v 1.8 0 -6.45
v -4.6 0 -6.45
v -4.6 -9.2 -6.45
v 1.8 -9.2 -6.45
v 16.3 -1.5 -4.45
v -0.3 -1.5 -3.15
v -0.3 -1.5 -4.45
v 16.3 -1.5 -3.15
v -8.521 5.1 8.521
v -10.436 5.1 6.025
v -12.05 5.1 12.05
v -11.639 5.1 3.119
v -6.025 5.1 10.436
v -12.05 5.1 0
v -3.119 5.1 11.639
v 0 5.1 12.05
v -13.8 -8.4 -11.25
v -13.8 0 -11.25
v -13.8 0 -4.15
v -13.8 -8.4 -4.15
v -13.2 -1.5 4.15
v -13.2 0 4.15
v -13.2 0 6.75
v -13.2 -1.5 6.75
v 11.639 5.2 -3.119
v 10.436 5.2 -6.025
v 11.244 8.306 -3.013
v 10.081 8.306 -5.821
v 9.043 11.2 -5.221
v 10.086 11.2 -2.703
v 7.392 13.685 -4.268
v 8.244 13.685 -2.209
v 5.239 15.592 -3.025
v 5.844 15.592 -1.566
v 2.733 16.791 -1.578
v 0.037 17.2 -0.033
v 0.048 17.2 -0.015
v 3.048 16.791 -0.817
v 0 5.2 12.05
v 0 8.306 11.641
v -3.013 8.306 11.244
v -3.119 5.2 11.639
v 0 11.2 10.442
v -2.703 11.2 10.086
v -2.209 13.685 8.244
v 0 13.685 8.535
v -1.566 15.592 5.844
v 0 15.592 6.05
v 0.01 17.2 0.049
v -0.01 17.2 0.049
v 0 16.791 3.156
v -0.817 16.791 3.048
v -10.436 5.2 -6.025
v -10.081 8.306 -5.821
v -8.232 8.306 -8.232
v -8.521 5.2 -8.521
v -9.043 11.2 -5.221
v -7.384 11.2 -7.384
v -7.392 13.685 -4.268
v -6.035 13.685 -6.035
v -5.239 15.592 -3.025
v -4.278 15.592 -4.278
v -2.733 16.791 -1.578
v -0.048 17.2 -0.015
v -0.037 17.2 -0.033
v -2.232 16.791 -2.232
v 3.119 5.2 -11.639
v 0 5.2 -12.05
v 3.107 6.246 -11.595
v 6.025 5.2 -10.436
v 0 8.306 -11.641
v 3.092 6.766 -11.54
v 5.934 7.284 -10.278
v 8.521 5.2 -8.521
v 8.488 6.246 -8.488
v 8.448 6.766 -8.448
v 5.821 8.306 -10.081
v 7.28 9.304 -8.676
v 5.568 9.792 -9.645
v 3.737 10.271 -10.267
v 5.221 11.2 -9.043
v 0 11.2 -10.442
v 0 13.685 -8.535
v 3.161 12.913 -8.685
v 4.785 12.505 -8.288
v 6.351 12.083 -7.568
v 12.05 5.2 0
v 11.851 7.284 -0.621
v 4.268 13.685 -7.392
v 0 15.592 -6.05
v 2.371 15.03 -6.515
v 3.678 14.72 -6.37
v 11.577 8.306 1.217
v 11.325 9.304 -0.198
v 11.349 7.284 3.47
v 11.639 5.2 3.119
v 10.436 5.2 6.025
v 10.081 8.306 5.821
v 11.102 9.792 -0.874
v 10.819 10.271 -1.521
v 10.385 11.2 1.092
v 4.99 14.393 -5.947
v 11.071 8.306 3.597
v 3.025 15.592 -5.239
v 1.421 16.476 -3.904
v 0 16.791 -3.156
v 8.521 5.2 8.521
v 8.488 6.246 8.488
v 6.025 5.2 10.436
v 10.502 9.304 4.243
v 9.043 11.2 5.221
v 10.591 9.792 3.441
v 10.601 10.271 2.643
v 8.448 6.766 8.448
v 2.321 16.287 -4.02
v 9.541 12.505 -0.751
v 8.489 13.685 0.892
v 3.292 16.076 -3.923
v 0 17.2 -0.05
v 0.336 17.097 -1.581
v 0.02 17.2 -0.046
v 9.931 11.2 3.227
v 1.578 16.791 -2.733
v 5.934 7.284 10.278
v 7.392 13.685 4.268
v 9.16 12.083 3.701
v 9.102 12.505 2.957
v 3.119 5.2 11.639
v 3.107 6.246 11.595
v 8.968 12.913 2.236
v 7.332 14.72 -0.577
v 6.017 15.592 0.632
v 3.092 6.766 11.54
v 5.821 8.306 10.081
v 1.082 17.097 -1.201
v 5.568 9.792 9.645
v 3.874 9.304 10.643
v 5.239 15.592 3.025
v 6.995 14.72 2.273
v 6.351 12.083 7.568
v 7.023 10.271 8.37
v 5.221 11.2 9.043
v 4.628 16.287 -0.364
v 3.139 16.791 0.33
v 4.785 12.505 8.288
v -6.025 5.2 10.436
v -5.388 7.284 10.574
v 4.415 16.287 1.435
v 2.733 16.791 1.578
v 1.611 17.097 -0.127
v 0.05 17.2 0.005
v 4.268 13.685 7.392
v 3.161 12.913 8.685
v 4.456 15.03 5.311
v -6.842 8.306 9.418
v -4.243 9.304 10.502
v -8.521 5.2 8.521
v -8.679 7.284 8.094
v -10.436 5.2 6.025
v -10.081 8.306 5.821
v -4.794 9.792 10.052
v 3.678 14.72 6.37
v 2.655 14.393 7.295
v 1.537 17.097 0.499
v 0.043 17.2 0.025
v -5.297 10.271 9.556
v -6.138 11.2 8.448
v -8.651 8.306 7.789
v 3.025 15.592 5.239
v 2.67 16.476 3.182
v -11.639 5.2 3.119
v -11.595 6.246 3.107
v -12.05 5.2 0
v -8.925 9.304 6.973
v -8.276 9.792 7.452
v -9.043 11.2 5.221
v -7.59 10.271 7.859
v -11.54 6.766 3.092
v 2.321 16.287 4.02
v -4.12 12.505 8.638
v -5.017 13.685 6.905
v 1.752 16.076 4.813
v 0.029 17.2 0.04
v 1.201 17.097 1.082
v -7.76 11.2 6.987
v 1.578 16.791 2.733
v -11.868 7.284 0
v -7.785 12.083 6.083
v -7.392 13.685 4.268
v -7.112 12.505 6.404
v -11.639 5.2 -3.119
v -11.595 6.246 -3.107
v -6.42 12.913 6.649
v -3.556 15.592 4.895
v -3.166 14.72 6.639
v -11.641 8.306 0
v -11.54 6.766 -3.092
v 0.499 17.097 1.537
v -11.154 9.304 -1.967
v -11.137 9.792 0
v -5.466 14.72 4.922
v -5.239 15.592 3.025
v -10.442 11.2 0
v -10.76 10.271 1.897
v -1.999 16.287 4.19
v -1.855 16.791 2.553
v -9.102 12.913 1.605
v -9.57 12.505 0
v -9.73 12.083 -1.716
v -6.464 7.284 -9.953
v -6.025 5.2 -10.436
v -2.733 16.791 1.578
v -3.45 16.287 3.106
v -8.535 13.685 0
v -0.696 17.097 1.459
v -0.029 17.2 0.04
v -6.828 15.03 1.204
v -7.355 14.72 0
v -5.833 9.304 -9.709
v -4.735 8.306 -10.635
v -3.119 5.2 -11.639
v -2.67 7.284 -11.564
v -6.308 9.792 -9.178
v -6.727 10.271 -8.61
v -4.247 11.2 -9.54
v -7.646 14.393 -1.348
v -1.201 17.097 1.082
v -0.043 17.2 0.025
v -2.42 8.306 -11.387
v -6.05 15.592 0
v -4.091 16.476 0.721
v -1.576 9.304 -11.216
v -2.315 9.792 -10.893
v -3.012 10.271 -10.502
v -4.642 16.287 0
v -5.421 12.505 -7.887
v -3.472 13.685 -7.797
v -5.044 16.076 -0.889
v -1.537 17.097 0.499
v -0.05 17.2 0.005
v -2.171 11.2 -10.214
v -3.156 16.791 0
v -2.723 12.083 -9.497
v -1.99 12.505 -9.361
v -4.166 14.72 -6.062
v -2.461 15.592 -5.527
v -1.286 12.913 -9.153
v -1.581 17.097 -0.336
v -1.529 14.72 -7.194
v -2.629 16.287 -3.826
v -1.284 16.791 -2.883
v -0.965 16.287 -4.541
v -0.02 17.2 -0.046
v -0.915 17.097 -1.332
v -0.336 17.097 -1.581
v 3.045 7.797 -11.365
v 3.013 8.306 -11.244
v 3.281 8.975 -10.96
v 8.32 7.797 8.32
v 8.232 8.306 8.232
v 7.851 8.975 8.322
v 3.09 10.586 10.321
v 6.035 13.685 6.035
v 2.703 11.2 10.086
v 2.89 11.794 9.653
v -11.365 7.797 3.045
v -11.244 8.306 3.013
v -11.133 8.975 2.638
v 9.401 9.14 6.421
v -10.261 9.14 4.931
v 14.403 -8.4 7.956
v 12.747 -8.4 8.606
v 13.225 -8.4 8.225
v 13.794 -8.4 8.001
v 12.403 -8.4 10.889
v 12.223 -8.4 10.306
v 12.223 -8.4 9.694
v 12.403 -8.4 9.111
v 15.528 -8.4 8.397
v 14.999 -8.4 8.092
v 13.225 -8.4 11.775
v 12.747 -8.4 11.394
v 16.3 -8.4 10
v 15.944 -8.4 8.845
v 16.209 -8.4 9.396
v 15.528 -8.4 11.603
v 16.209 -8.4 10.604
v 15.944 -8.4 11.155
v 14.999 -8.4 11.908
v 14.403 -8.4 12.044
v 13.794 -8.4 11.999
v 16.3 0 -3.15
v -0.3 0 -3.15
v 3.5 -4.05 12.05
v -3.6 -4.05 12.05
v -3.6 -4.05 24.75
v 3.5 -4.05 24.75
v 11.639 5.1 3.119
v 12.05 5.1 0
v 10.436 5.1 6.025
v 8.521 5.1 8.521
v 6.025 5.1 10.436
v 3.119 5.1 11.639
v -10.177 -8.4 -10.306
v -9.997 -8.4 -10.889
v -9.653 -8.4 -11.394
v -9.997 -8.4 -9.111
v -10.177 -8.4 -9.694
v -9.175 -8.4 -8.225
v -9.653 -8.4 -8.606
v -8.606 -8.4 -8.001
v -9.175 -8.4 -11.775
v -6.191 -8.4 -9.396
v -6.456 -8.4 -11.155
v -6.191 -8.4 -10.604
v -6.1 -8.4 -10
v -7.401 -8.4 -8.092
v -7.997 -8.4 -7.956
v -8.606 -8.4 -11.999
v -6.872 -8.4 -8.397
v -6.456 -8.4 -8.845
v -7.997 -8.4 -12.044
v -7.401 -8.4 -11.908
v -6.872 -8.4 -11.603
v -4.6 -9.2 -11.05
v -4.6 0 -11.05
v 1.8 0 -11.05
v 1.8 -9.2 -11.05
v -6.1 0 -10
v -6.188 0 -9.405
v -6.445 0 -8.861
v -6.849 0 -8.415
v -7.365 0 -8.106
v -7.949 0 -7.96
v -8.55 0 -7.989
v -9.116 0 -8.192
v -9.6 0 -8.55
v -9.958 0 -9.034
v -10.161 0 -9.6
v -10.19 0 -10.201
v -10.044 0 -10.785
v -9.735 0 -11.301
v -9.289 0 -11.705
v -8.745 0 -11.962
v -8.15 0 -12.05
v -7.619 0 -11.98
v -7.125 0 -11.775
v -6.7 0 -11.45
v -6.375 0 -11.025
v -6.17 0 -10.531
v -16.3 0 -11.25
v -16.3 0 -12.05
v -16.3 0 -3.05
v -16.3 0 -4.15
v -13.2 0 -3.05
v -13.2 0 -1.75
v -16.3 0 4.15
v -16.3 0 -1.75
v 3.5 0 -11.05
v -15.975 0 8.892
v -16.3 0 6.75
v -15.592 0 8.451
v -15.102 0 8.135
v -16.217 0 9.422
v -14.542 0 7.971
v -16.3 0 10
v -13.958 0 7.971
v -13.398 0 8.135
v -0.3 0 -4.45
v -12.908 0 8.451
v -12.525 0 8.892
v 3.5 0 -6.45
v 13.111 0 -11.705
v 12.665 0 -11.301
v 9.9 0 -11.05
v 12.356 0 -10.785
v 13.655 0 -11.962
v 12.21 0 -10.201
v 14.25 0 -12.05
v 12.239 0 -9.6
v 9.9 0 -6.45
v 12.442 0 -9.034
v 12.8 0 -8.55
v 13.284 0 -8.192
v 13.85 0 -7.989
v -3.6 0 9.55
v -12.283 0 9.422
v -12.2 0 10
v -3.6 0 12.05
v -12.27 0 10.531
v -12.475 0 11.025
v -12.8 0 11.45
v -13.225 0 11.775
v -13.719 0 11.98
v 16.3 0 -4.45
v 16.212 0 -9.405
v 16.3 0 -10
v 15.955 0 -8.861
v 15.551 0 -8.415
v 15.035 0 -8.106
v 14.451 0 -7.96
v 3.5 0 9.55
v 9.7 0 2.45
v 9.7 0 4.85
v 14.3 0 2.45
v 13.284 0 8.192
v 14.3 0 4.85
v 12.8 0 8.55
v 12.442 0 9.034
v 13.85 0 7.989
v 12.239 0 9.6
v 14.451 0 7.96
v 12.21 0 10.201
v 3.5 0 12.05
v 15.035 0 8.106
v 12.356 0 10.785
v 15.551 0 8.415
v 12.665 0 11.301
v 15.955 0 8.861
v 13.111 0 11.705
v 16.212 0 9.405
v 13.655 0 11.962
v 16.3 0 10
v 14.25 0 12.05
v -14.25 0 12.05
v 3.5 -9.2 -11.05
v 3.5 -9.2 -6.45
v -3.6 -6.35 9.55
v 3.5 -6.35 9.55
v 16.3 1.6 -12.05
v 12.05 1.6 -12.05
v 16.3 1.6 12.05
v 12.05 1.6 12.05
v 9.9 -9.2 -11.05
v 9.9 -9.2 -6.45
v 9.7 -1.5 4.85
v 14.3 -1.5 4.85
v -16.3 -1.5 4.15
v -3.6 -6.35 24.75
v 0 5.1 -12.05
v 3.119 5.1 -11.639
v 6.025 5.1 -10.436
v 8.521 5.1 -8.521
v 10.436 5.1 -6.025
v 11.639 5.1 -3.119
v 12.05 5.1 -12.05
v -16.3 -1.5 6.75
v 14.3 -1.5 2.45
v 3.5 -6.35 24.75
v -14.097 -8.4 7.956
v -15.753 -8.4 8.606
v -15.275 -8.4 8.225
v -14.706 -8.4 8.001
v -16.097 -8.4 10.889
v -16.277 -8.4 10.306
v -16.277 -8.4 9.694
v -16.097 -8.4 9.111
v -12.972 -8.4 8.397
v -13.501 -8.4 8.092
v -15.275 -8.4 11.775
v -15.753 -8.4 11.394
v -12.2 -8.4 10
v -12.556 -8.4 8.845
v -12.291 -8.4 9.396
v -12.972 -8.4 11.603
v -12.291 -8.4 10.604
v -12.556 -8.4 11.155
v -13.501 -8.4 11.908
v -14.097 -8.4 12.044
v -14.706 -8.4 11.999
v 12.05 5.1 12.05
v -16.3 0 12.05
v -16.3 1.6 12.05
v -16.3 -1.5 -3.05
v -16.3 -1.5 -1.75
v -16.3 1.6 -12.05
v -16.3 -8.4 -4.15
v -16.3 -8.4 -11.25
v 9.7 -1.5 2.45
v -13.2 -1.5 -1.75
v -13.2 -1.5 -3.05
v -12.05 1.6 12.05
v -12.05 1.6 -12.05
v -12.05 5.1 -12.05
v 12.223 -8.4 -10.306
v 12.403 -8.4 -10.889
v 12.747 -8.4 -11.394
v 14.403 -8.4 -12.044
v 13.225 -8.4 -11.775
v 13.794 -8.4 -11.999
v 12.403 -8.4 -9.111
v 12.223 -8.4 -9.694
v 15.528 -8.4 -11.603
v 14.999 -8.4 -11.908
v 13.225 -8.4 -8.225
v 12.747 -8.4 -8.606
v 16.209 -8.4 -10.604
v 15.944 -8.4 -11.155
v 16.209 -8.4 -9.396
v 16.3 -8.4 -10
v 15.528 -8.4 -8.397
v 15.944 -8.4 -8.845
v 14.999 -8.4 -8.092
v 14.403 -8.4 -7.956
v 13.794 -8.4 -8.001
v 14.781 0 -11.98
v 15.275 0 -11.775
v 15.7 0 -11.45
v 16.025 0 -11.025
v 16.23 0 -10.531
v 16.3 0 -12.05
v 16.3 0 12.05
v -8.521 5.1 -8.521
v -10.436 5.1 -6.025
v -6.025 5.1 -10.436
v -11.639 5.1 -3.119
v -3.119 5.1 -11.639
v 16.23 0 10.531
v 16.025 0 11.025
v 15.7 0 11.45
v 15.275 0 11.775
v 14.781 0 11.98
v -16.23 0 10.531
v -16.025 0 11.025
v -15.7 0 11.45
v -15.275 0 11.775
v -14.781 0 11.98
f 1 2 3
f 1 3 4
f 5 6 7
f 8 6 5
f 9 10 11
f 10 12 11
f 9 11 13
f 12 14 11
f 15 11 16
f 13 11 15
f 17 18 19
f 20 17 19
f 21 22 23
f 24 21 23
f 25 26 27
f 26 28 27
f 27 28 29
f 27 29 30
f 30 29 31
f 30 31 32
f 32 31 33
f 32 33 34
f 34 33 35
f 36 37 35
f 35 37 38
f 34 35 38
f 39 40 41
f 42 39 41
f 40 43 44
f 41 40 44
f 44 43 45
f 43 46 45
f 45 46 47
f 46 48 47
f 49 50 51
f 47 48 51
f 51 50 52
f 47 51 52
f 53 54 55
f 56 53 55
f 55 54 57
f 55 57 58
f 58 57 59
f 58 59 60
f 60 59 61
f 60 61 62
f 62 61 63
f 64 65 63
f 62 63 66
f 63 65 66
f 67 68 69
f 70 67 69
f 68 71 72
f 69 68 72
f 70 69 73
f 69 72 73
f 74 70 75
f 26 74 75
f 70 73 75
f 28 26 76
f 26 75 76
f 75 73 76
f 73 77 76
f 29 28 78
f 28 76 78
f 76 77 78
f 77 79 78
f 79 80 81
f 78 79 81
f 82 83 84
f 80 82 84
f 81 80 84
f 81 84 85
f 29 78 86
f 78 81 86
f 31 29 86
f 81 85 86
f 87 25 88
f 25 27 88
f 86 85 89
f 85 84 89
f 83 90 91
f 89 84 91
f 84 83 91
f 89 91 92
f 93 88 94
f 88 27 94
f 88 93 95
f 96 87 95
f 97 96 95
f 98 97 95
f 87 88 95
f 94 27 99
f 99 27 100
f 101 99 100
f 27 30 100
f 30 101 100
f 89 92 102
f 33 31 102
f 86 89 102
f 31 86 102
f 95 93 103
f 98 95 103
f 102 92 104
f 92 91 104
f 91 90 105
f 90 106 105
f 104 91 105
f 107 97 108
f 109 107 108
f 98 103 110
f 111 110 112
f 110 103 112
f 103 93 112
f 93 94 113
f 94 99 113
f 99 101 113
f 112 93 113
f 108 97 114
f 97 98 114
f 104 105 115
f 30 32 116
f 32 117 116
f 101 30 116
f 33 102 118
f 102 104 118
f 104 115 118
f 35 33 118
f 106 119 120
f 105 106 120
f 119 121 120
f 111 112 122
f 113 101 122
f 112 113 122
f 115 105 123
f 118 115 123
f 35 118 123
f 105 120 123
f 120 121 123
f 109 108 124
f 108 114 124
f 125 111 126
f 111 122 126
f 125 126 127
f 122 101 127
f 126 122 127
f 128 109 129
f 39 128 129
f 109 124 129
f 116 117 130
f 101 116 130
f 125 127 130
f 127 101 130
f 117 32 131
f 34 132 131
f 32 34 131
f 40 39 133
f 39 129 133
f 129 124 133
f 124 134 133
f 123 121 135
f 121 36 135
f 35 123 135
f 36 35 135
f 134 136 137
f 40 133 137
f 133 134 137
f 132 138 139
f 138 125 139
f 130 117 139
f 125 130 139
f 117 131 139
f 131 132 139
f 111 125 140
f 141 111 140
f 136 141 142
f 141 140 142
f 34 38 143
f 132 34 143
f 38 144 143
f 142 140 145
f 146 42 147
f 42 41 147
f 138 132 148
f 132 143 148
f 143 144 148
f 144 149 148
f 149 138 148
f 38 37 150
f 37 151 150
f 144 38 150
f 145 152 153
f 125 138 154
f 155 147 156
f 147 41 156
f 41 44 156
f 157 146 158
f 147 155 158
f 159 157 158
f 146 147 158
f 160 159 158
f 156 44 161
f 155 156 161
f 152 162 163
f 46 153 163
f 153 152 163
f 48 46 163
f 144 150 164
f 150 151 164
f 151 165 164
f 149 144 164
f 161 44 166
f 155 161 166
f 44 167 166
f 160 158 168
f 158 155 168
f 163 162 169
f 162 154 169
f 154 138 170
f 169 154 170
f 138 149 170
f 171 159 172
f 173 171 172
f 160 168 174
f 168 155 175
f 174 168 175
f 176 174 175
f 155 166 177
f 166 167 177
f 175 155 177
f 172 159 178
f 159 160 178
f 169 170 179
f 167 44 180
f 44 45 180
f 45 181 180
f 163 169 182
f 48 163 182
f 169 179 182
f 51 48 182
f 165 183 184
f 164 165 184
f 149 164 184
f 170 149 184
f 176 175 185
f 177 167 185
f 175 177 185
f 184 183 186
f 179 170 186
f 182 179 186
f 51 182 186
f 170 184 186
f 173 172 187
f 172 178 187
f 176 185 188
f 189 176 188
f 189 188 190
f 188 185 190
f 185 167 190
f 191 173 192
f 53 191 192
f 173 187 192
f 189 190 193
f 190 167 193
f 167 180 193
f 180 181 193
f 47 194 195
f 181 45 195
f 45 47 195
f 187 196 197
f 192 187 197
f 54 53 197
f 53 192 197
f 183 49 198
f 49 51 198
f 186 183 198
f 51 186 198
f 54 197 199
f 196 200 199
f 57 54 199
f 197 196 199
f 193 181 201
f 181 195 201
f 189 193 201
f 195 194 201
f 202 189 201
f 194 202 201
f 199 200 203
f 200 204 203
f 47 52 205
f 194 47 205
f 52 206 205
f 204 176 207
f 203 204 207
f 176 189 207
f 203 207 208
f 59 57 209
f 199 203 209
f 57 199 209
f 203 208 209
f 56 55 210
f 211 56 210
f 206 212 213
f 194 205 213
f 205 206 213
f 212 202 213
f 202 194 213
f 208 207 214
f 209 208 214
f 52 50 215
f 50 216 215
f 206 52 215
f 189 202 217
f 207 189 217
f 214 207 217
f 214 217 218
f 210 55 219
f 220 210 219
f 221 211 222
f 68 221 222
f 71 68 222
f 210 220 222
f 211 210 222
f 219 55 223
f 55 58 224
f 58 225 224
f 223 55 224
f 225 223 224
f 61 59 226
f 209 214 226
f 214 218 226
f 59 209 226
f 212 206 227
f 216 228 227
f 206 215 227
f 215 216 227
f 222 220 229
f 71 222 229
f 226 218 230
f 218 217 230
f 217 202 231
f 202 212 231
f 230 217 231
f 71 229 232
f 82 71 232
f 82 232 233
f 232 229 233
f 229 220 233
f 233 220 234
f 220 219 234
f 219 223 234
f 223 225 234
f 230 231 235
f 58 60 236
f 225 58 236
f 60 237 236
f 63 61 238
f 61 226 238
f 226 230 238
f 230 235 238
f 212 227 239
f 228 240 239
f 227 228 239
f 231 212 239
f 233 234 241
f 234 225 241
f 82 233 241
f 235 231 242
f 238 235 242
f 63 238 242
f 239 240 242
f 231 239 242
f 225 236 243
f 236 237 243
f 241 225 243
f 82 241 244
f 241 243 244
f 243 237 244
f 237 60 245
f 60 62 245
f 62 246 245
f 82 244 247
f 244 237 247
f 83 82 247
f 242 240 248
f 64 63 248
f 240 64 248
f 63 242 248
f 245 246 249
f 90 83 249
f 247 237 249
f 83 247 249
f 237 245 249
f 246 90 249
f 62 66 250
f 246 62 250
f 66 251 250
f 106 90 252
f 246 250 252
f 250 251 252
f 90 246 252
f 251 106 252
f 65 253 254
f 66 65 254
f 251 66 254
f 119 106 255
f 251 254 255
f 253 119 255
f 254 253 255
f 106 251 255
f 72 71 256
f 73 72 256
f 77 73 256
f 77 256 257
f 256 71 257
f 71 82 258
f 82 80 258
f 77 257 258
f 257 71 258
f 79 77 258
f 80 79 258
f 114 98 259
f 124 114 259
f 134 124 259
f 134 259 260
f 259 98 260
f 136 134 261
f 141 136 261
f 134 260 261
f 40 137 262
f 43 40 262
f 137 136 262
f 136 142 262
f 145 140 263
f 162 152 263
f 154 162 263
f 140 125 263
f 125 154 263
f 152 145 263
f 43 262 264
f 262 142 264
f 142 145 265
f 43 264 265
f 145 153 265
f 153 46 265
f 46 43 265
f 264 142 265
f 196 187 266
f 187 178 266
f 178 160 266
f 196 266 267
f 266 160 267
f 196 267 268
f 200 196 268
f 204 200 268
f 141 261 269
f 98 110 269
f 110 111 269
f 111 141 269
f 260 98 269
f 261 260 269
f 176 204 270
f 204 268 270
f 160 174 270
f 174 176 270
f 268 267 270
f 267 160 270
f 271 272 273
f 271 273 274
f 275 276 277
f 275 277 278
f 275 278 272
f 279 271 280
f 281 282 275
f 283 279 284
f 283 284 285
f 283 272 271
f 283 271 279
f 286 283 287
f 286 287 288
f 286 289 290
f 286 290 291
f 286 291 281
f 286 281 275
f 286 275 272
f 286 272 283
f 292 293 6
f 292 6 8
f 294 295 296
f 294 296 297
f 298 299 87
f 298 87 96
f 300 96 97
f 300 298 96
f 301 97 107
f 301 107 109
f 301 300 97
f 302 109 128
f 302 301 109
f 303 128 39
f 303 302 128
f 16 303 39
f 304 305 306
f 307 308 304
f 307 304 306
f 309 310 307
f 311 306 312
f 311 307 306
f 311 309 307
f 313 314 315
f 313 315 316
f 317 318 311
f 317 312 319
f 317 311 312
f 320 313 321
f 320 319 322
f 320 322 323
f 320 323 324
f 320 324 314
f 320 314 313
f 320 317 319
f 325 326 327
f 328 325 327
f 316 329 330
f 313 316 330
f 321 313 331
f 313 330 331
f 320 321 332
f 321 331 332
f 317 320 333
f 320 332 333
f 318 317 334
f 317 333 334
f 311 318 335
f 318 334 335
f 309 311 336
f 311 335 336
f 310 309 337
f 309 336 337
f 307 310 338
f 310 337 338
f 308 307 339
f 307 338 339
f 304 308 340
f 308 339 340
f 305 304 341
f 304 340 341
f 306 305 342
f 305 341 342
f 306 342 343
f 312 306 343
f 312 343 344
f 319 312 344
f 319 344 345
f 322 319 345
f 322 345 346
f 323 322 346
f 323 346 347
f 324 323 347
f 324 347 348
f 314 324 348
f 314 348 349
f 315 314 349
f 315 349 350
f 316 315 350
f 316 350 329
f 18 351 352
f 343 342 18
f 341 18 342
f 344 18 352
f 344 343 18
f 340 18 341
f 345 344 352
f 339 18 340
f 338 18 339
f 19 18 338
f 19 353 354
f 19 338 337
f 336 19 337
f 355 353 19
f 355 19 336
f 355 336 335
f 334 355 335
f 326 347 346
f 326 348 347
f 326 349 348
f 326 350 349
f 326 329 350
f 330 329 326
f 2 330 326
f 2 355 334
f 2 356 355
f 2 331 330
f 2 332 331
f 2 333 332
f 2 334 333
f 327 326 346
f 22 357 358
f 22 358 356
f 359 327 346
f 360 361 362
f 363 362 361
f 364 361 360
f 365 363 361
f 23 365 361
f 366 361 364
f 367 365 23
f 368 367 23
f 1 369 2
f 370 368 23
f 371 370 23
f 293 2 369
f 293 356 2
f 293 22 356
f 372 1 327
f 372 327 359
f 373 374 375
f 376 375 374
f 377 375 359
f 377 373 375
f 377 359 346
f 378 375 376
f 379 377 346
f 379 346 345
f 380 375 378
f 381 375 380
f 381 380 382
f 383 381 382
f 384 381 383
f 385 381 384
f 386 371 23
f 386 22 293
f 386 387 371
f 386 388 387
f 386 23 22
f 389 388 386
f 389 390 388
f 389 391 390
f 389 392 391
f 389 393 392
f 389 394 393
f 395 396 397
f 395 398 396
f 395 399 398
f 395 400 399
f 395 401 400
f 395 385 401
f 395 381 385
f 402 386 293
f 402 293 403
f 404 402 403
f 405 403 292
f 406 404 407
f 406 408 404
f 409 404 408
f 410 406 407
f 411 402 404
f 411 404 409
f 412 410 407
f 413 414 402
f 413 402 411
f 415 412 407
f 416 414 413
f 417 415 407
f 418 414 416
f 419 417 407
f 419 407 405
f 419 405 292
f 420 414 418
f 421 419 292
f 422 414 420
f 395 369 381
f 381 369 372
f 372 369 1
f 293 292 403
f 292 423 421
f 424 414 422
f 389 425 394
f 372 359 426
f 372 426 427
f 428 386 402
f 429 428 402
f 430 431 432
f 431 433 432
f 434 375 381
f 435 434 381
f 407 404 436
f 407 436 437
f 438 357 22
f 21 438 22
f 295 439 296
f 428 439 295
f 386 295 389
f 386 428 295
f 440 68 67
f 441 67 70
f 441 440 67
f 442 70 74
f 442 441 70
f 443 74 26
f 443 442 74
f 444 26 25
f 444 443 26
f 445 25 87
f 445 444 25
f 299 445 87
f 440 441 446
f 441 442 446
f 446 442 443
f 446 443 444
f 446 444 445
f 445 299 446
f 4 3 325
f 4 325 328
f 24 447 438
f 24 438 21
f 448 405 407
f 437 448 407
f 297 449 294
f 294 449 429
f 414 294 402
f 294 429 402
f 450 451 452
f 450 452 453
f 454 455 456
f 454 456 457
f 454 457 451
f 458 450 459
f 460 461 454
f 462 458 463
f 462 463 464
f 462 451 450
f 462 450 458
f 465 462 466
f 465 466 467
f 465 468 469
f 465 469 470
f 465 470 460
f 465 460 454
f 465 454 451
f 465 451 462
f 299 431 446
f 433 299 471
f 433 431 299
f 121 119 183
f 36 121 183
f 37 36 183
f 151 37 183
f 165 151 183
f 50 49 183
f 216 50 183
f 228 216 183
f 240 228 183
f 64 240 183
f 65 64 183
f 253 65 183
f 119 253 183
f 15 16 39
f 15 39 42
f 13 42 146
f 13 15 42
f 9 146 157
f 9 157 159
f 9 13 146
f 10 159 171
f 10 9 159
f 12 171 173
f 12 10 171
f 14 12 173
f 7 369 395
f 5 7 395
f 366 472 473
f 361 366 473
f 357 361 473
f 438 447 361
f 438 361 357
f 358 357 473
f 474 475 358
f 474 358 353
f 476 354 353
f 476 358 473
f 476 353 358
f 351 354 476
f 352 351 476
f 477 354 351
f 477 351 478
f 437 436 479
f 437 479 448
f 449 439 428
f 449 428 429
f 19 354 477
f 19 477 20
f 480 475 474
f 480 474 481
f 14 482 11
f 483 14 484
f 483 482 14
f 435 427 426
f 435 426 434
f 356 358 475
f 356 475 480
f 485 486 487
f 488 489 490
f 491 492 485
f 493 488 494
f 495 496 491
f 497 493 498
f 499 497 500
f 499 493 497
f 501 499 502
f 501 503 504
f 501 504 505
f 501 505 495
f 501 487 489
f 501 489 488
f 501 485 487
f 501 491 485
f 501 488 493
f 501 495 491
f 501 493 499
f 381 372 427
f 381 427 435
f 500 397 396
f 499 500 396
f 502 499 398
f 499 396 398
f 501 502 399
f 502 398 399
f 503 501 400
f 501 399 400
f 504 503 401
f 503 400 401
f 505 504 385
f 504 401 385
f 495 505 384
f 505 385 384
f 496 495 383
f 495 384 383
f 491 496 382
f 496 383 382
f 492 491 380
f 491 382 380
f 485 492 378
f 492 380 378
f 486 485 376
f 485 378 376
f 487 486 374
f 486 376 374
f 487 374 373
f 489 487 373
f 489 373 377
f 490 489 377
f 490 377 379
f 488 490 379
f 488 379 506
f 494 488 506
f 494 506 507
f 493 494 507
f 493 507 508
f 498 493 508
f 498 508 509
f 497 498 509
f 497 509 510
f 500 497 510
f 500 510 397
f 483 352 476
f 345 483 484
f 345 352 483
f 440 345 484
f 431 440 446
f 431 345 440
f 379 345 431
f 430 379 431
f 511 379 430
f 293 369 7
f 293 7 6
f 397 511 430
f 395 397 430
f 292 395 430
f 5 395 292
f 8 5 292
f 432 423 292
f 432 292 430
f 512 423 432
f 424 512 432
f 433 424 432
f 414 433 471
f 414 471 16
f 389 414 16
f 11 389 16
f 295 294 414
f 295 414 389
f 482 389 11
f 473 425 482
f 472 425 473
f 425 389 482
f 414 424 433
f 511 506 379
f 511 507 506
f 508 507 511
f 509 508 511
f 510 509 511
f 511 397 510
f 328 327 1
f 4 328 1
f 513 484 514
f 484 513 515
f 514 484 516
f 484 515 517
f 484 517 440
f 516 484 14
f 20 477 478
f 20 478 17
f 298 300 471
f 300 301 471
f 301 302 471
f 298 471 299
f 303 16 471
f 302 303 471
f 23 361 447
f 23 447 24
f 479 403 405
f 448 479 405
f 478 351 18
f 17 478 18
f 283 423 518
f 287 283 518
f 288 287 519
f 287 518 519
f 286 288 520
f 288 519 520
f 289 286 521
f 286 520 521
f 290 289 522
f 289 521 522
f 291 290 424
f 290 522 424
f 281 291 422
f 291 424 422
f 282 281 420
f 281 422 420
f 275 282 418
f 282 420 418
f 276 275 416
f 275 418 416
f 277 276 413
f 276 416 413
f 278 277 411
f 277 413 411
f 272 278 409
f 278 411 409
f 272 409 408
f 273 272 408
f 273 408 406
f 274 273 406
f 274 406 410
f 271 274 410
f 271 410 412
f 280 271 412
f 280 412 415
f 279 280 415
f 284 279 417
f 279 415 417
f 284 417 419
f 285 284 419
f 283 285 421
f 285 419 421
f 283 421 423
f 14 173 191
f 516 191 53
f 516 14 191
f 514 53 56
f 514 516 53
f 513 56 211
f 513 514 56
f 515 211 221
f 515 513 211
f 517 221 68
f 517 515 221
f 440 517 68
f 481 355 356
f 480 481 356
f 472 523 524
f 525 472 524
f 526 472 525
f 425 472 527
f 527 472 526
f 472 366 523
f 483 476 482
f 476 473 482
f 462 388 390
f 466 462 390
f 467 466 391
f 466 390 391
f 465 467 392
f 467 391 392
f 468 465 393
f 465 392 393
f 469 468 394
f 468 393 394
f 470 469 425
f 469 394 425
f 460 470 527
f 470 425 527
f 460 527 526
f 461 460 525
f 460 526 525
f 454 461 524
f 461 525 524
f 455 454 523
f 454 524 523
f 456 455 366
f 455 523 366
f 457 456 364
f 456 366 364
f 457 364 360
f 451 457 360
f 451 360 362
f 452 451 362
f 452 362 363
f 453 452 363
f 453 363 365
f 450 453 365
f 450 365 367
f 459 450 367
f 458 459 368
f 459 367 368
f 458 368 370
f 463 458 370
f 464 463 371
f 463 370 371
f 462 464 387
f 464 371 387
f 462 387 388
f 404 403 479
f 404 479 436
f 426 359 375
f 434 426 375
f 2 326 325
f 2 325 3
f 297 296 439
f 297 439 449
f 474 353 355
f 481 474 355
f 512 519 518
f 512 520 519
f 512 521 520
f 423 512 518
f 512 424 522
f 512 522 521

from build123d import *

# Parameters (mm, degrees)
F2_DEPTH  = 1.6
F3_DEPTH  = 5.1
F4_DEPTH  = 17.2
F1_R      = 2.05
F1_W      = 2.5
F1_H      = 7.1
F6_DEPTH  = 8.4
F1_W_2    = 6.4
F1_H_2    = 4.6
F7_DEPTH  = 9.2
F1_W_3    = 3.1
F1_H_3    = 1.3
F1_W_4    = 4.6
F1_H_4    = 2.4
F1_W_5    = 16.6
F1_H_5    = 2.6
F8_DEPTH  = 1.5
F1_W_6    = 7.1
F1_H_6    = 2.5
F9_DEPTH  = 6.35
F10_W     = 7.1
F10_H     = 2.3
F11_DEPTH = 12.7


# Not quite as in the source:
# - a fillet or chamfer that OpenCascade refuses, or shapes differently, is made with other operations: its cross-section is extruded or revolved along the edge and cut away or added


with BuildPart() as f2:
    # F0 (on Front) → F2 (new body)
    with BuildSketch(Plane.XZ):
        Polygon((16.3, -12.05), (16.3, 12.05), (12.05, 12.05), (12.05, 0), (12.05, -12.05), align=None)
        with BuildLine():
            Line((12.05, 0), (12.05, 12.05))
            Line((12.05, 12.05), (0, 12.05))
            ThreePointArc((0, 12.05), (8.5206367133, 8.5206367133), (12.05, 0))
        make_face()
        with BuildLine():
            ThreePointArc((-12.05, 0), (-8.5206367133, 8.5206367133), (0, 12.05))
            Line((0, 12.05), (-12.05, 12.05))
            Line((-12.05, 12.05), (-12.05, 0))
        make_face()
        with BuildLine():
            ThreePointArc((12.05, 0), (8.5206367133, 8.5206367133), (0, 12.05))
            ThreePointArc((0, 12.05), (-8.5206367133, 8.5206367133), (-12.05, 0))
            ThreePointArc((-12.05, 0), (-8.5206367125, -8.5206367141), (2.1e-09, -12.05))
            ThreePointArc((2.1e-09, -12.05), (8.5206367141, -8.5206367125), (12.05, 0))
        make_face()
        with BuildLine():
            Line((12.05, -12.05), (12.05, 0))
            ThreePointArc((12.05, 0), (8.5206367141, -8.5206367125), (2.1e-09, -12.05))
            Line((2.1e-09, -12.05), (12.05, -12.05))
        make_face()
        Polygon((-12.05, 0), (-12.05, 12.05), (-16.3, 12.05), (-16.3, -12.05), (-12.05, -12.05), align=None)
        with BuildLine():
            ThreePointArc((2.1e-09, -12.05), (-8.5206367125, -8.5206367141), (-12.05, 0))
            Line((-12.05, 0), (-12.05, -12.05))
            Line((-12.05, -12.05), (2.1e-09, -12.05))
        make_face()
    extrude(amount=-F2_DEPTH)

    # F0 (on Front) → F3 (join)
    with BuildSketch(Plane.XZ):
        with BuildLine():
            ThreePointArc((2.1e-09, -12.05), (-8.5206367125, -8.5206367141), (-12.05, 0))
            Line((-12.05, 0), (-12.05, -12.05))
            Line((-12.05, -12.05), (2.1e-09, -12.05))
        make_face()
        with BuildLine():
            ThreePointArc((-12.05, 0), (-8.5206367133, 8.5206367133), (0, 12.05))
            Line((0, 12.05), (-12.05, 12.05))
            Line((-12.05, 12.05), (-12.05, 0))
        make_face()
        with BuildLine():
            ThreePointArc((12.05, 0), (8.5206367133, 8.5206367133), (0, 12.05))
            ThreePointArc((0, 12.05), (-8.5206367133, 8.5206367133), (-12.05, 0))
            ThreePointArc((-12.05, 0), (-8.5206367125, -8.5206367141), (2.1e-09, -12.05))
            ThreePointArc((2.1e-09, -12.05), (8.5206367141, -8.5206367125), (12.05, 0))
        make_face()
        with BuildLine():
            Line((12.05, 0), (12.05, 12.05))
            Line((12.05, 12.05), (0, 12.05))
            ThreePointArc((0, 12.05), (8.5206367133, 8.5206367133), (12.05, 0))
        make_face()
        with BuildLine():
            Line((12.05, -12.05), (12.05, 0))
            ThreePointArc((12.05, 0), (8.5206367141, -8.5206367125), (2.1e-09, -12.05))
            Line((2.1e-09, -12.05), (12.05, -12.05))
        make_face()
    extrude(amount=-F3_DEPTH)

    # F0 (on Front) → F4 (join)
    with BuildSketch(Plane.XZ):
        with BuildLine():
            ThreePointArc((12.05, 0), (8.5206367133, 8.5206367133), (0, 12.05))
            ThreePointArc((0, 12.05), (-8.5206367133, 8.5206367133), (-12.05, 0))
            ThreePointArc((-12.05, 0), (-8.5206367125, -8.5206367141), (2.1e-09, -12.05))
            ThreePointArc((2.1e-09, -12.05), (8.5206367141, -8.5206367125), (12.05, 0))
        make_face()
    extrude(amount=-F4_DEPTH)

    # F5: fillet of radius 12 on 1 edges, made by hand

    # F5_s1 → F5_t2 (revolve, cut)
    with BuildSketch(Plane.YZ):
        with BuildLine():
            ThreePointArc((5.2, -12.05), (13.6852813742, -8.5352813742), (17.2, -0.05))
            Line((17.2, -0.05), (17.2, -12.05))
            Line((17.2, -12.05), (5.2, -12.05))
        make_face()
    revolve(axis=Axis((0, 17.2, 0), (0, -1, 0)), mode=Mode.SUBTRACT)

    # F1 (on Front) → F6 (join)
    with BuildSketch(Plane.XZ):
        with Locations((-14.25, 10)):
            Circle(F1_R)
        with Locations((14.25, 10)):
            Circle(F1_R)
        with Locations((14.25, -10)):
            Circle(F1_R)
        with Locations((-8.15, -10)):
            Circle(F1_R)
        with Locations((-15.05, -7.7)):
            Rectangle(F1_W, F1_H)
    extrude(amount=F6_DEPTH)

    # F1 (on Front) → F7 (join)
    with BuildSketch(Plane.XZ):
        with Locations((-1.4, -8.75)):
            Rectangle(F1_W_2, F1_H_2)
        with Locations((6.7, -8.75)):
            Rectangle(F1_W_2, F1_H_2)
    extrude(amount=F7_DEPTH)

    # F1 (on Front) → F8 (join)
    with BuildSketch(Plane.XZ):
        with Locations((-14.75, -2.4)):
            Rectangle(F1_W_3, F1_H_3)
        with Locations((12, 3.65)):
            Rectangle(F1_W_4, F1_H_4)
        with Locations((8, -3.8)):
            Rectangle(F1_W_5, F1_H_3)
        with Locations((-14.75, 5.45)):
            Rectangle(F1_W_3, F1_H_5)
    extrude(amount=F8_DEPTH)

    # F1 (on Front) → F9 (join)
    with BuildSketch(Plane.XZ):
        with Locations((-0.05, 10.8)):
            Rectangle(F1_W_6, F1_H_6)
    extrude(amount=F9_DEPTH)

    # F10 (on face) → F11 (join)
    with BuildSketch(Plane.XY.offset(12.05)):
        with Locations((-0.05, -5.2)):
            Rectangle(F10_W, F10_H)
    extrude(amount=F11_DEPTH)


solid = f2.part
